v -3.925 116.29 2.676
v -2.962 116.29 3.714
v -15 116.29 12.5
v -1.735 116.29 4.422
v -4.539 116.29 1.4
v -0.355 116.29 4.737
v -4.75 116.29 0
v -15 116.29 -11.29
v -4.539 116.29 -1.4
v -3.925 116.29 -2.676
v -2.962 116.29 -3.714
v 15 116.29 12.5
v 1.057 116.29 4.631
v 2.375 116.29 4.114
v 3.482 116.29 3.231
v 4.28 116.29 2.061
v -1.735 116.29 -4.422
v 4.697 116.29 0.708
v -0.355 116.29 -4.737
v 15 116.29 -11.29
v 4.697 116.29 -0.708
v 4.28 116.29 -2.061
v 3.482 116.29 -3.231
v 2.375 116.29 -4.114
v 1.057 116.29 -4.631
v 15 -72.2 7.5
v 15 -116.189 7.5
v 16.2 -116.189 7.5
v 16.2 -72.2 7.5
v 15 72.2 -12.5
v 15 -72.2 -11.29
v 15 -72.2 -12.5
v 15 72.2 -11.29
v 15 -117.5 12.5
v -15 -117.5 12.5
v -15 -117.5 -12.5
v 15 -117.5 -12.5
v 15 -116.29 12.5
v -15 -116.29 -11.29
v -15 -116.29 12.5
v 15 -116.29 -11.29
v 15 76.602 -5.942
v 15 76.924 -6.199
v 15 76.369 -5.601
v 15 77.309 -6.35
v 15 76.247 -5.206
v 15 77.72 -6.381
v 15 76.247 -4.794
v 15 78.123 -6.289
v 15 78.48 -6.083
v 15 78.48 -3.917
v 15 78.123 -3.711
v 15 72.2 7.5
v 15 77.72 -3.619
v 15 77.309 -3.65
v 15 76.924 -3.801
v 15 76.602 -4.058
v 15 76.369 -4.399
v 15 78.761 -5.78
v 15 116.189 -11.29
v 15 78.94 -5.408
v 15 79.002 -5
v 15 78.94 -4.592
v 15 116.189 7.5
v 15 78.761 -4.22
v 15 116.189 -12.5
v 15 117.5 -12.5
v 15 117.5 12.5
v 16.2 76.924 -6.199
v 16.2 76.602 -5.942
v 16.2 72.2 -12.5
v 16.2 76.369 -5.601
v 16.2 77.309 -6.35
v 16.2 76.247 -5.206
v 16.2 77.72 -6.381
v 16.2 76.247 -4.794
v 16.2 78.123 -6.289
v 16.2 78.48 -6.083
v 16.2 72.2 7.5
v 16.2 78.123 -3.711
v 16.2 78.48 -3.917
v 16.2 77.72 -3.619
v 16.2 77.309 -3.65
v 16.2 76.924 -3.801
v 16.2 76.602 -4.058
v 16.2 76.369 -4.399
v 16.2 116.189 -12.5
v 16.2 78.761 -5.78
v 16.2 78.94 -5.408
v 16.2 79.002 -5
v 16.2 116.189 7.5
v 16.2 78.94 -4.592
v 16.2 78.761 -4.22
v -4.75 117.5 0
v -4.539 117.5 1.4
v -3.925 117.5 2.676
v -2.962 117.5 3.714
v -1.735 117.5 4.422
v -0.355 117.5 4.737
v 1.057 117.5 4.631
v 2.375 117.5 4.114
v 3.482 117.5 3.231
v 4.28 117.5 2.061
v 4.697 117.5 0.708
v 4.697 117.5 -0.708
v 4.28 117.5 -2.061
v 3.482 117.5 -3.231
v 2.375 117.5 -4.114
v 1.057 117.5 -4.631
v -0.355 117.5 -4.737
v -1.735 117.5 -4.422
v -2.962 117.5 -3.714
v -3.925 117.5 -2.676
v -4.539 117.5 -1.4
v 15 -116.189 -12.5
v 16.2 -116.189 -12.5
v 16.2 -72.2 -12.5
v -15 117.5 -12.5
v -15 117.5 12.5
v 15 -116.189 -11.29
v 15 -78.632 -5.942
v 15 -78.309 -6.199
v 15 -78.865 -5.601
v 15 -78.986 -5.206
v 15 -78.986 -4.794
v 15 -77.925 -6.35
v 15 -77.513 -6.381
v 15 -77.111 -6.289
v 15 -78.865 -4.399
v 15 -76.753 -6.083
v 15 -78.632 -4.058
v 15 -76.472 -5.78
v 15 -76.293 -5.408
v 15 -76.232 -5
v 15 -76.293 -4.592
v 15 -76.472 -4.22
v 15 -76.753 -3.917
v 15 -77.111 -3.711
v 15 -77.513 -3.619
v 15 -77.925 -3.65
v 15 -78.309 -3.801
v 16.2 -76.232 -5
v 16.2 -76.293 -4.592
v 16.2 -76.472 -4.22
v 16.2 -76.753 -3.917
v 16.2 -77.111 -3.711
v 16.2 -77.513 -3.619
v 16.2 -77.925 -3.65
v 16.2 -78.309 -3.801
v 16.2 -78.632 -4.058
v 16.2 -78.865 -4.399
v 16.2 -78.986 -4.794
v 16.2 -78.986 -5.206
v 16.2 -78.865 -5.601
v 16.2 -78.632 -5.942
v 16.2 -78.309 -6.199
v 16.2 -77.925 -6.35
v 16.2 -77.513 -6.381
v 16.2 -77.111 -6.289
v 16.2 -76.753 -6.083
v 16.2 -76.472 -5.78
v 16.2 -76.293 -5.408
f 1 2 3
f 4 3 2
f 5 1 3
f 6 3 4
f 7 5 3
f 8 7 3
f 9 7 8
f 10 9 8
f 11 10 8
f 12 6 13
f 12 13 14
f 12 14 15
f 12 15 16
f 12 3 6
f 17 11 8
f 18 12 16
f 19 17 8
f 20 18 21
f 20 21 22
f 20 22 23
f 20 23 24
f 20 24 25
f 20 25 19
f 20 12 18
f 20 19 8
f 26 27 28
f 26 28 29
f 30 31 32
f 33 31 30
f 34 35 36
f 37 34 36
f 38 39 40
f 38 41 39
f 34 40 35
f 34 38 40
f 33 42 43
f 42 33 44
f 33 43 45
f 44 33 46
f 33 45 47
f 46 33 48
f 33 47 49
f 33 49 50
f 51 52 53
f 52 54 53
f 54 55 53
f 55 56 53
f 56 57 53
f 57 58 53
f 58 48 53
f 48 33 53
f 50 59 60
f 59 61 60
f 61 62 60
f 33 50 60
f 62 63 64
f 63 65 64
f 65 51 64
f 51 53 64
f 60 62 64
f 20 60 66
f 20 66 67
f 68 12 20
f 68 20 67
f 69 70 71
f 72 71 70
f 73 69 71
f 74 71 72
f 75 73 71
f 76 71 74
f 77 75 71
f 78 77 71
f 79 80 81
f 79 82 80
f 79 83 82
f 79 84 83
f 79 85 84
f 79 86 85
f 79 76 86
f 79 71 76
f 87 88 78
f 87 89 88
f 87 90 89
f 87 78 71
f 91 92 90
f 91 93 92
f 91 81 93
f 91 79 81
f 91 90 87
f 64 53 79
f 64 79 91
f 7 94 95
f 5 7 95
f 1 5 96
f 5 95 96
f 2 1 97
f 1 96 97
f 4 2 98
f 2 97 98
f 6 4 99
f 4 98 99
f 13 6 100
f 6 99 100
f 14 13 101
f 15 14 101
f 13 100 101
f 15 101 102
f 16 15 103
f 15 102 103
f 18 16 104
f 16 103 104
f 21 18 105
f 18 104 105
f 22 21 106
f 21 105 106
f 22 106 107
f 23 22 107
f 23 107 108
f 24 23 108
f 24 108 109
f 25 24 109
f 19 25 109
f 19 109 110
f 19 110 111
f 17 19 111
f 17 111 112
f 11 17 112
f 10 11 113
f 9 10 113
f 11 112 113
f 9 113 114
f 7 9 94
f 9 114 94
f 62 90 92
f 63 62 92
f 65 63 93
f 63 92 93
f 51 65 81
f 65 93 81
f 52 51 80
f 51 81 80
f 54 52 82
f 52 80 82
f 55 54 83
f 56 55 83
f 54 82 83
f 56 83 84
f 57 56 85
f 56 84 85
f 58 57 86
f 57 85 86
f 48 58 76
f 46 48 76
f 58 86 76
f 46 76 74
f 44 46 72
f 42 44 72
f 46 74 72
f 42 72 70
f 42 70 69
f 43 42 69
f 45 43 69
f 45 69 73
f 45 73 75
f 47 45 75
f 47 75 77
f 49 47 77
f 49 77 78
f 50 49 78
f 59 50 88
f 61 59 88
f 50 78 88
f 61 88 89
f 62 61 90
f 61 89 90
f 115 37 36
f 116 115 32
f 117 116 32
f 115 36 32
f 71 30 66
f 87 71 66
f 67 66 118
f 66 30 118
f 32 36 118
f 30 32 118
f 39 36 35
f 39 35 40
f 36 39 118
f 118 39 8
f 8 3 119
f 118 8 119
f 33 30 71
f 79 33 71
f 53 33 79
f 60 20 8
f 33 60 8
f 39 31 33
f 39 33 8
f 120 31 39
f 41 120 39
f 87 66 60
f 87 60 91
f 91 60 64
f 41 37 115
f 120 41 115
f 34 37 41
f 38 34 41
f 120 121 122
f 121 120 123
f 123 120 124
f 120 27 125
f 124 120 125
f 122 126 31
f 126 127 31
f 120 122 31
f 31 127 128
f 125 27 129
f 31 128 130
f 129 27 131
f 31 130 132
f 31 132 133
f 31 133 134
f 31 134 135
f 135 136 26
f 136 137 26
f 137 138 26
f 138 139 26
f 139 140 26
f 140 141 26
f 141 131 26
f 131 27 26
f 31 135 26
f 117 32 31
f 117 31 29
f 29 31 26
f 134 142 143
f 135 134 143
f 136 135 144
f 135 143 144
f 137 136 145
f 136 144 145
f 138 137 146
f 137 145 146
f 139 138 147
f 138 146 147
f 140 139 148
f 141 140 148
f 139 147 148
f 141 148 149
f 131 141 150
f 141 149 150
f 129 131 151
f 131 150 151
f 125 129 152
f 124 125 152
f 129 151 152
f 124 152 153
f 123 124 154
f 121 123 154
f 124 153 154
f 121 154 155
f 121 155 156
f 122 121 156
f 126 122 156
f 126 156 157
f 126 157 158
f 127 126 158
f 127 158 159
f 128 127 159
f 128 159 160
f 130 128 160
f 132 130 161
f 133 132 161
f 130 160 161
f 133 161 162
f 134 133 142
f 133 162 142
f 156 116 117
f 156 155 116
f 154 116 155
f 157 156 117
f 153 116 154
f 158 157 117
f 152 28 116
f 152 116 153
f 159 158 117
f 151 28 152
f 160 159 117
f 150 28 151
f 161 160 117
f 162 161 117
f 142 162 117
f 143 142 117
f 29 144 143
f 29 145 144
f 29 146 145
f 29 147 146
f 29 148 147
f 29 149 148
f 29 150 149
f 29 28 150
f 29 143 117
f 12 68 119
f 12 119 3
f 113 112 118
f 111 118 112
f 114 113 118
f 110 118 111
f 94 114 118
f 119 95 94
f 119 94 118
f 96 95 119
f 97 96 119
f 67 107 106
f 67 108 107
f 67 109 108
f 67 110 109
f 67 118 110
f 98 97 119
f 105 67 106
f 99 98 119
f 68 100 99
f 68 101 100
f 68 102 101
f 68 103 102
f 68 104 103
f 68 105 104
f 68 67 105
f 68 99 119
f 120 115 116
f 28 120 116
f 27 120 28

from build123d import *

# Parameters (mm, degrees)
F1_DEPTH = 15
F3_W     = 43.98863
F3_H     = 20
F4_DEPTH = 1.2
F2_R     = 4.75
F5_DEPTH = 1.21
F6_R     = 1.385
F7_DEPTH = 1.2


with BuildPart() as f1:
    # F0 (on Right) → F1 (new body, symmetric)
    with BuildSketch(Plane.YZ):
        Polygon((-116.29, 12.5), (-117.5, 12.5), (-117.5, -12.5), (117.5, -12.5), (117.5, 12.5), (116.29, 12.5), (116.29, -11.29), (0, -11.29), (-116.29, -11.29), align=None)
    extrude(amount=F1_DEPTH, both=True)

    # F3 (on face) → F4 (join)
    with BuildSketch(Plane.YZ.offset(15)):
        with Locations((-94.194315, -2.5)):
            Rectangle(F3_W, F3_H)
        with Locations((94.194315, -2.5)):
            Rectangle(F3_W, F3_H)
    extrude(amount=F4_DEPTH)

    # F2 (on face) → F5 (cut, through all)
    with BuildSketch(Plane(origin=(0, 117.5, 0), x_dir=(-1, 0, 0), z_dir=(0, 1, 0))):
        Circle(F2_R)
    extrude(amount=-F5_DEPTH, mode=Mode.SUBTRACT)

    # F6 (on face) → F7 (cut, through all)
    with BuildSketch(Plane.YZ.offset(16.2)):
        with Locations((-77.616818, -5)):
            Circle(F6_R)
        with Locations((77.616818, -5)):
            Circle(F6_R)
    extrude(amount=-F7_DEPTH, mode=Mode.SUBTRACT)


solid = f1.part
